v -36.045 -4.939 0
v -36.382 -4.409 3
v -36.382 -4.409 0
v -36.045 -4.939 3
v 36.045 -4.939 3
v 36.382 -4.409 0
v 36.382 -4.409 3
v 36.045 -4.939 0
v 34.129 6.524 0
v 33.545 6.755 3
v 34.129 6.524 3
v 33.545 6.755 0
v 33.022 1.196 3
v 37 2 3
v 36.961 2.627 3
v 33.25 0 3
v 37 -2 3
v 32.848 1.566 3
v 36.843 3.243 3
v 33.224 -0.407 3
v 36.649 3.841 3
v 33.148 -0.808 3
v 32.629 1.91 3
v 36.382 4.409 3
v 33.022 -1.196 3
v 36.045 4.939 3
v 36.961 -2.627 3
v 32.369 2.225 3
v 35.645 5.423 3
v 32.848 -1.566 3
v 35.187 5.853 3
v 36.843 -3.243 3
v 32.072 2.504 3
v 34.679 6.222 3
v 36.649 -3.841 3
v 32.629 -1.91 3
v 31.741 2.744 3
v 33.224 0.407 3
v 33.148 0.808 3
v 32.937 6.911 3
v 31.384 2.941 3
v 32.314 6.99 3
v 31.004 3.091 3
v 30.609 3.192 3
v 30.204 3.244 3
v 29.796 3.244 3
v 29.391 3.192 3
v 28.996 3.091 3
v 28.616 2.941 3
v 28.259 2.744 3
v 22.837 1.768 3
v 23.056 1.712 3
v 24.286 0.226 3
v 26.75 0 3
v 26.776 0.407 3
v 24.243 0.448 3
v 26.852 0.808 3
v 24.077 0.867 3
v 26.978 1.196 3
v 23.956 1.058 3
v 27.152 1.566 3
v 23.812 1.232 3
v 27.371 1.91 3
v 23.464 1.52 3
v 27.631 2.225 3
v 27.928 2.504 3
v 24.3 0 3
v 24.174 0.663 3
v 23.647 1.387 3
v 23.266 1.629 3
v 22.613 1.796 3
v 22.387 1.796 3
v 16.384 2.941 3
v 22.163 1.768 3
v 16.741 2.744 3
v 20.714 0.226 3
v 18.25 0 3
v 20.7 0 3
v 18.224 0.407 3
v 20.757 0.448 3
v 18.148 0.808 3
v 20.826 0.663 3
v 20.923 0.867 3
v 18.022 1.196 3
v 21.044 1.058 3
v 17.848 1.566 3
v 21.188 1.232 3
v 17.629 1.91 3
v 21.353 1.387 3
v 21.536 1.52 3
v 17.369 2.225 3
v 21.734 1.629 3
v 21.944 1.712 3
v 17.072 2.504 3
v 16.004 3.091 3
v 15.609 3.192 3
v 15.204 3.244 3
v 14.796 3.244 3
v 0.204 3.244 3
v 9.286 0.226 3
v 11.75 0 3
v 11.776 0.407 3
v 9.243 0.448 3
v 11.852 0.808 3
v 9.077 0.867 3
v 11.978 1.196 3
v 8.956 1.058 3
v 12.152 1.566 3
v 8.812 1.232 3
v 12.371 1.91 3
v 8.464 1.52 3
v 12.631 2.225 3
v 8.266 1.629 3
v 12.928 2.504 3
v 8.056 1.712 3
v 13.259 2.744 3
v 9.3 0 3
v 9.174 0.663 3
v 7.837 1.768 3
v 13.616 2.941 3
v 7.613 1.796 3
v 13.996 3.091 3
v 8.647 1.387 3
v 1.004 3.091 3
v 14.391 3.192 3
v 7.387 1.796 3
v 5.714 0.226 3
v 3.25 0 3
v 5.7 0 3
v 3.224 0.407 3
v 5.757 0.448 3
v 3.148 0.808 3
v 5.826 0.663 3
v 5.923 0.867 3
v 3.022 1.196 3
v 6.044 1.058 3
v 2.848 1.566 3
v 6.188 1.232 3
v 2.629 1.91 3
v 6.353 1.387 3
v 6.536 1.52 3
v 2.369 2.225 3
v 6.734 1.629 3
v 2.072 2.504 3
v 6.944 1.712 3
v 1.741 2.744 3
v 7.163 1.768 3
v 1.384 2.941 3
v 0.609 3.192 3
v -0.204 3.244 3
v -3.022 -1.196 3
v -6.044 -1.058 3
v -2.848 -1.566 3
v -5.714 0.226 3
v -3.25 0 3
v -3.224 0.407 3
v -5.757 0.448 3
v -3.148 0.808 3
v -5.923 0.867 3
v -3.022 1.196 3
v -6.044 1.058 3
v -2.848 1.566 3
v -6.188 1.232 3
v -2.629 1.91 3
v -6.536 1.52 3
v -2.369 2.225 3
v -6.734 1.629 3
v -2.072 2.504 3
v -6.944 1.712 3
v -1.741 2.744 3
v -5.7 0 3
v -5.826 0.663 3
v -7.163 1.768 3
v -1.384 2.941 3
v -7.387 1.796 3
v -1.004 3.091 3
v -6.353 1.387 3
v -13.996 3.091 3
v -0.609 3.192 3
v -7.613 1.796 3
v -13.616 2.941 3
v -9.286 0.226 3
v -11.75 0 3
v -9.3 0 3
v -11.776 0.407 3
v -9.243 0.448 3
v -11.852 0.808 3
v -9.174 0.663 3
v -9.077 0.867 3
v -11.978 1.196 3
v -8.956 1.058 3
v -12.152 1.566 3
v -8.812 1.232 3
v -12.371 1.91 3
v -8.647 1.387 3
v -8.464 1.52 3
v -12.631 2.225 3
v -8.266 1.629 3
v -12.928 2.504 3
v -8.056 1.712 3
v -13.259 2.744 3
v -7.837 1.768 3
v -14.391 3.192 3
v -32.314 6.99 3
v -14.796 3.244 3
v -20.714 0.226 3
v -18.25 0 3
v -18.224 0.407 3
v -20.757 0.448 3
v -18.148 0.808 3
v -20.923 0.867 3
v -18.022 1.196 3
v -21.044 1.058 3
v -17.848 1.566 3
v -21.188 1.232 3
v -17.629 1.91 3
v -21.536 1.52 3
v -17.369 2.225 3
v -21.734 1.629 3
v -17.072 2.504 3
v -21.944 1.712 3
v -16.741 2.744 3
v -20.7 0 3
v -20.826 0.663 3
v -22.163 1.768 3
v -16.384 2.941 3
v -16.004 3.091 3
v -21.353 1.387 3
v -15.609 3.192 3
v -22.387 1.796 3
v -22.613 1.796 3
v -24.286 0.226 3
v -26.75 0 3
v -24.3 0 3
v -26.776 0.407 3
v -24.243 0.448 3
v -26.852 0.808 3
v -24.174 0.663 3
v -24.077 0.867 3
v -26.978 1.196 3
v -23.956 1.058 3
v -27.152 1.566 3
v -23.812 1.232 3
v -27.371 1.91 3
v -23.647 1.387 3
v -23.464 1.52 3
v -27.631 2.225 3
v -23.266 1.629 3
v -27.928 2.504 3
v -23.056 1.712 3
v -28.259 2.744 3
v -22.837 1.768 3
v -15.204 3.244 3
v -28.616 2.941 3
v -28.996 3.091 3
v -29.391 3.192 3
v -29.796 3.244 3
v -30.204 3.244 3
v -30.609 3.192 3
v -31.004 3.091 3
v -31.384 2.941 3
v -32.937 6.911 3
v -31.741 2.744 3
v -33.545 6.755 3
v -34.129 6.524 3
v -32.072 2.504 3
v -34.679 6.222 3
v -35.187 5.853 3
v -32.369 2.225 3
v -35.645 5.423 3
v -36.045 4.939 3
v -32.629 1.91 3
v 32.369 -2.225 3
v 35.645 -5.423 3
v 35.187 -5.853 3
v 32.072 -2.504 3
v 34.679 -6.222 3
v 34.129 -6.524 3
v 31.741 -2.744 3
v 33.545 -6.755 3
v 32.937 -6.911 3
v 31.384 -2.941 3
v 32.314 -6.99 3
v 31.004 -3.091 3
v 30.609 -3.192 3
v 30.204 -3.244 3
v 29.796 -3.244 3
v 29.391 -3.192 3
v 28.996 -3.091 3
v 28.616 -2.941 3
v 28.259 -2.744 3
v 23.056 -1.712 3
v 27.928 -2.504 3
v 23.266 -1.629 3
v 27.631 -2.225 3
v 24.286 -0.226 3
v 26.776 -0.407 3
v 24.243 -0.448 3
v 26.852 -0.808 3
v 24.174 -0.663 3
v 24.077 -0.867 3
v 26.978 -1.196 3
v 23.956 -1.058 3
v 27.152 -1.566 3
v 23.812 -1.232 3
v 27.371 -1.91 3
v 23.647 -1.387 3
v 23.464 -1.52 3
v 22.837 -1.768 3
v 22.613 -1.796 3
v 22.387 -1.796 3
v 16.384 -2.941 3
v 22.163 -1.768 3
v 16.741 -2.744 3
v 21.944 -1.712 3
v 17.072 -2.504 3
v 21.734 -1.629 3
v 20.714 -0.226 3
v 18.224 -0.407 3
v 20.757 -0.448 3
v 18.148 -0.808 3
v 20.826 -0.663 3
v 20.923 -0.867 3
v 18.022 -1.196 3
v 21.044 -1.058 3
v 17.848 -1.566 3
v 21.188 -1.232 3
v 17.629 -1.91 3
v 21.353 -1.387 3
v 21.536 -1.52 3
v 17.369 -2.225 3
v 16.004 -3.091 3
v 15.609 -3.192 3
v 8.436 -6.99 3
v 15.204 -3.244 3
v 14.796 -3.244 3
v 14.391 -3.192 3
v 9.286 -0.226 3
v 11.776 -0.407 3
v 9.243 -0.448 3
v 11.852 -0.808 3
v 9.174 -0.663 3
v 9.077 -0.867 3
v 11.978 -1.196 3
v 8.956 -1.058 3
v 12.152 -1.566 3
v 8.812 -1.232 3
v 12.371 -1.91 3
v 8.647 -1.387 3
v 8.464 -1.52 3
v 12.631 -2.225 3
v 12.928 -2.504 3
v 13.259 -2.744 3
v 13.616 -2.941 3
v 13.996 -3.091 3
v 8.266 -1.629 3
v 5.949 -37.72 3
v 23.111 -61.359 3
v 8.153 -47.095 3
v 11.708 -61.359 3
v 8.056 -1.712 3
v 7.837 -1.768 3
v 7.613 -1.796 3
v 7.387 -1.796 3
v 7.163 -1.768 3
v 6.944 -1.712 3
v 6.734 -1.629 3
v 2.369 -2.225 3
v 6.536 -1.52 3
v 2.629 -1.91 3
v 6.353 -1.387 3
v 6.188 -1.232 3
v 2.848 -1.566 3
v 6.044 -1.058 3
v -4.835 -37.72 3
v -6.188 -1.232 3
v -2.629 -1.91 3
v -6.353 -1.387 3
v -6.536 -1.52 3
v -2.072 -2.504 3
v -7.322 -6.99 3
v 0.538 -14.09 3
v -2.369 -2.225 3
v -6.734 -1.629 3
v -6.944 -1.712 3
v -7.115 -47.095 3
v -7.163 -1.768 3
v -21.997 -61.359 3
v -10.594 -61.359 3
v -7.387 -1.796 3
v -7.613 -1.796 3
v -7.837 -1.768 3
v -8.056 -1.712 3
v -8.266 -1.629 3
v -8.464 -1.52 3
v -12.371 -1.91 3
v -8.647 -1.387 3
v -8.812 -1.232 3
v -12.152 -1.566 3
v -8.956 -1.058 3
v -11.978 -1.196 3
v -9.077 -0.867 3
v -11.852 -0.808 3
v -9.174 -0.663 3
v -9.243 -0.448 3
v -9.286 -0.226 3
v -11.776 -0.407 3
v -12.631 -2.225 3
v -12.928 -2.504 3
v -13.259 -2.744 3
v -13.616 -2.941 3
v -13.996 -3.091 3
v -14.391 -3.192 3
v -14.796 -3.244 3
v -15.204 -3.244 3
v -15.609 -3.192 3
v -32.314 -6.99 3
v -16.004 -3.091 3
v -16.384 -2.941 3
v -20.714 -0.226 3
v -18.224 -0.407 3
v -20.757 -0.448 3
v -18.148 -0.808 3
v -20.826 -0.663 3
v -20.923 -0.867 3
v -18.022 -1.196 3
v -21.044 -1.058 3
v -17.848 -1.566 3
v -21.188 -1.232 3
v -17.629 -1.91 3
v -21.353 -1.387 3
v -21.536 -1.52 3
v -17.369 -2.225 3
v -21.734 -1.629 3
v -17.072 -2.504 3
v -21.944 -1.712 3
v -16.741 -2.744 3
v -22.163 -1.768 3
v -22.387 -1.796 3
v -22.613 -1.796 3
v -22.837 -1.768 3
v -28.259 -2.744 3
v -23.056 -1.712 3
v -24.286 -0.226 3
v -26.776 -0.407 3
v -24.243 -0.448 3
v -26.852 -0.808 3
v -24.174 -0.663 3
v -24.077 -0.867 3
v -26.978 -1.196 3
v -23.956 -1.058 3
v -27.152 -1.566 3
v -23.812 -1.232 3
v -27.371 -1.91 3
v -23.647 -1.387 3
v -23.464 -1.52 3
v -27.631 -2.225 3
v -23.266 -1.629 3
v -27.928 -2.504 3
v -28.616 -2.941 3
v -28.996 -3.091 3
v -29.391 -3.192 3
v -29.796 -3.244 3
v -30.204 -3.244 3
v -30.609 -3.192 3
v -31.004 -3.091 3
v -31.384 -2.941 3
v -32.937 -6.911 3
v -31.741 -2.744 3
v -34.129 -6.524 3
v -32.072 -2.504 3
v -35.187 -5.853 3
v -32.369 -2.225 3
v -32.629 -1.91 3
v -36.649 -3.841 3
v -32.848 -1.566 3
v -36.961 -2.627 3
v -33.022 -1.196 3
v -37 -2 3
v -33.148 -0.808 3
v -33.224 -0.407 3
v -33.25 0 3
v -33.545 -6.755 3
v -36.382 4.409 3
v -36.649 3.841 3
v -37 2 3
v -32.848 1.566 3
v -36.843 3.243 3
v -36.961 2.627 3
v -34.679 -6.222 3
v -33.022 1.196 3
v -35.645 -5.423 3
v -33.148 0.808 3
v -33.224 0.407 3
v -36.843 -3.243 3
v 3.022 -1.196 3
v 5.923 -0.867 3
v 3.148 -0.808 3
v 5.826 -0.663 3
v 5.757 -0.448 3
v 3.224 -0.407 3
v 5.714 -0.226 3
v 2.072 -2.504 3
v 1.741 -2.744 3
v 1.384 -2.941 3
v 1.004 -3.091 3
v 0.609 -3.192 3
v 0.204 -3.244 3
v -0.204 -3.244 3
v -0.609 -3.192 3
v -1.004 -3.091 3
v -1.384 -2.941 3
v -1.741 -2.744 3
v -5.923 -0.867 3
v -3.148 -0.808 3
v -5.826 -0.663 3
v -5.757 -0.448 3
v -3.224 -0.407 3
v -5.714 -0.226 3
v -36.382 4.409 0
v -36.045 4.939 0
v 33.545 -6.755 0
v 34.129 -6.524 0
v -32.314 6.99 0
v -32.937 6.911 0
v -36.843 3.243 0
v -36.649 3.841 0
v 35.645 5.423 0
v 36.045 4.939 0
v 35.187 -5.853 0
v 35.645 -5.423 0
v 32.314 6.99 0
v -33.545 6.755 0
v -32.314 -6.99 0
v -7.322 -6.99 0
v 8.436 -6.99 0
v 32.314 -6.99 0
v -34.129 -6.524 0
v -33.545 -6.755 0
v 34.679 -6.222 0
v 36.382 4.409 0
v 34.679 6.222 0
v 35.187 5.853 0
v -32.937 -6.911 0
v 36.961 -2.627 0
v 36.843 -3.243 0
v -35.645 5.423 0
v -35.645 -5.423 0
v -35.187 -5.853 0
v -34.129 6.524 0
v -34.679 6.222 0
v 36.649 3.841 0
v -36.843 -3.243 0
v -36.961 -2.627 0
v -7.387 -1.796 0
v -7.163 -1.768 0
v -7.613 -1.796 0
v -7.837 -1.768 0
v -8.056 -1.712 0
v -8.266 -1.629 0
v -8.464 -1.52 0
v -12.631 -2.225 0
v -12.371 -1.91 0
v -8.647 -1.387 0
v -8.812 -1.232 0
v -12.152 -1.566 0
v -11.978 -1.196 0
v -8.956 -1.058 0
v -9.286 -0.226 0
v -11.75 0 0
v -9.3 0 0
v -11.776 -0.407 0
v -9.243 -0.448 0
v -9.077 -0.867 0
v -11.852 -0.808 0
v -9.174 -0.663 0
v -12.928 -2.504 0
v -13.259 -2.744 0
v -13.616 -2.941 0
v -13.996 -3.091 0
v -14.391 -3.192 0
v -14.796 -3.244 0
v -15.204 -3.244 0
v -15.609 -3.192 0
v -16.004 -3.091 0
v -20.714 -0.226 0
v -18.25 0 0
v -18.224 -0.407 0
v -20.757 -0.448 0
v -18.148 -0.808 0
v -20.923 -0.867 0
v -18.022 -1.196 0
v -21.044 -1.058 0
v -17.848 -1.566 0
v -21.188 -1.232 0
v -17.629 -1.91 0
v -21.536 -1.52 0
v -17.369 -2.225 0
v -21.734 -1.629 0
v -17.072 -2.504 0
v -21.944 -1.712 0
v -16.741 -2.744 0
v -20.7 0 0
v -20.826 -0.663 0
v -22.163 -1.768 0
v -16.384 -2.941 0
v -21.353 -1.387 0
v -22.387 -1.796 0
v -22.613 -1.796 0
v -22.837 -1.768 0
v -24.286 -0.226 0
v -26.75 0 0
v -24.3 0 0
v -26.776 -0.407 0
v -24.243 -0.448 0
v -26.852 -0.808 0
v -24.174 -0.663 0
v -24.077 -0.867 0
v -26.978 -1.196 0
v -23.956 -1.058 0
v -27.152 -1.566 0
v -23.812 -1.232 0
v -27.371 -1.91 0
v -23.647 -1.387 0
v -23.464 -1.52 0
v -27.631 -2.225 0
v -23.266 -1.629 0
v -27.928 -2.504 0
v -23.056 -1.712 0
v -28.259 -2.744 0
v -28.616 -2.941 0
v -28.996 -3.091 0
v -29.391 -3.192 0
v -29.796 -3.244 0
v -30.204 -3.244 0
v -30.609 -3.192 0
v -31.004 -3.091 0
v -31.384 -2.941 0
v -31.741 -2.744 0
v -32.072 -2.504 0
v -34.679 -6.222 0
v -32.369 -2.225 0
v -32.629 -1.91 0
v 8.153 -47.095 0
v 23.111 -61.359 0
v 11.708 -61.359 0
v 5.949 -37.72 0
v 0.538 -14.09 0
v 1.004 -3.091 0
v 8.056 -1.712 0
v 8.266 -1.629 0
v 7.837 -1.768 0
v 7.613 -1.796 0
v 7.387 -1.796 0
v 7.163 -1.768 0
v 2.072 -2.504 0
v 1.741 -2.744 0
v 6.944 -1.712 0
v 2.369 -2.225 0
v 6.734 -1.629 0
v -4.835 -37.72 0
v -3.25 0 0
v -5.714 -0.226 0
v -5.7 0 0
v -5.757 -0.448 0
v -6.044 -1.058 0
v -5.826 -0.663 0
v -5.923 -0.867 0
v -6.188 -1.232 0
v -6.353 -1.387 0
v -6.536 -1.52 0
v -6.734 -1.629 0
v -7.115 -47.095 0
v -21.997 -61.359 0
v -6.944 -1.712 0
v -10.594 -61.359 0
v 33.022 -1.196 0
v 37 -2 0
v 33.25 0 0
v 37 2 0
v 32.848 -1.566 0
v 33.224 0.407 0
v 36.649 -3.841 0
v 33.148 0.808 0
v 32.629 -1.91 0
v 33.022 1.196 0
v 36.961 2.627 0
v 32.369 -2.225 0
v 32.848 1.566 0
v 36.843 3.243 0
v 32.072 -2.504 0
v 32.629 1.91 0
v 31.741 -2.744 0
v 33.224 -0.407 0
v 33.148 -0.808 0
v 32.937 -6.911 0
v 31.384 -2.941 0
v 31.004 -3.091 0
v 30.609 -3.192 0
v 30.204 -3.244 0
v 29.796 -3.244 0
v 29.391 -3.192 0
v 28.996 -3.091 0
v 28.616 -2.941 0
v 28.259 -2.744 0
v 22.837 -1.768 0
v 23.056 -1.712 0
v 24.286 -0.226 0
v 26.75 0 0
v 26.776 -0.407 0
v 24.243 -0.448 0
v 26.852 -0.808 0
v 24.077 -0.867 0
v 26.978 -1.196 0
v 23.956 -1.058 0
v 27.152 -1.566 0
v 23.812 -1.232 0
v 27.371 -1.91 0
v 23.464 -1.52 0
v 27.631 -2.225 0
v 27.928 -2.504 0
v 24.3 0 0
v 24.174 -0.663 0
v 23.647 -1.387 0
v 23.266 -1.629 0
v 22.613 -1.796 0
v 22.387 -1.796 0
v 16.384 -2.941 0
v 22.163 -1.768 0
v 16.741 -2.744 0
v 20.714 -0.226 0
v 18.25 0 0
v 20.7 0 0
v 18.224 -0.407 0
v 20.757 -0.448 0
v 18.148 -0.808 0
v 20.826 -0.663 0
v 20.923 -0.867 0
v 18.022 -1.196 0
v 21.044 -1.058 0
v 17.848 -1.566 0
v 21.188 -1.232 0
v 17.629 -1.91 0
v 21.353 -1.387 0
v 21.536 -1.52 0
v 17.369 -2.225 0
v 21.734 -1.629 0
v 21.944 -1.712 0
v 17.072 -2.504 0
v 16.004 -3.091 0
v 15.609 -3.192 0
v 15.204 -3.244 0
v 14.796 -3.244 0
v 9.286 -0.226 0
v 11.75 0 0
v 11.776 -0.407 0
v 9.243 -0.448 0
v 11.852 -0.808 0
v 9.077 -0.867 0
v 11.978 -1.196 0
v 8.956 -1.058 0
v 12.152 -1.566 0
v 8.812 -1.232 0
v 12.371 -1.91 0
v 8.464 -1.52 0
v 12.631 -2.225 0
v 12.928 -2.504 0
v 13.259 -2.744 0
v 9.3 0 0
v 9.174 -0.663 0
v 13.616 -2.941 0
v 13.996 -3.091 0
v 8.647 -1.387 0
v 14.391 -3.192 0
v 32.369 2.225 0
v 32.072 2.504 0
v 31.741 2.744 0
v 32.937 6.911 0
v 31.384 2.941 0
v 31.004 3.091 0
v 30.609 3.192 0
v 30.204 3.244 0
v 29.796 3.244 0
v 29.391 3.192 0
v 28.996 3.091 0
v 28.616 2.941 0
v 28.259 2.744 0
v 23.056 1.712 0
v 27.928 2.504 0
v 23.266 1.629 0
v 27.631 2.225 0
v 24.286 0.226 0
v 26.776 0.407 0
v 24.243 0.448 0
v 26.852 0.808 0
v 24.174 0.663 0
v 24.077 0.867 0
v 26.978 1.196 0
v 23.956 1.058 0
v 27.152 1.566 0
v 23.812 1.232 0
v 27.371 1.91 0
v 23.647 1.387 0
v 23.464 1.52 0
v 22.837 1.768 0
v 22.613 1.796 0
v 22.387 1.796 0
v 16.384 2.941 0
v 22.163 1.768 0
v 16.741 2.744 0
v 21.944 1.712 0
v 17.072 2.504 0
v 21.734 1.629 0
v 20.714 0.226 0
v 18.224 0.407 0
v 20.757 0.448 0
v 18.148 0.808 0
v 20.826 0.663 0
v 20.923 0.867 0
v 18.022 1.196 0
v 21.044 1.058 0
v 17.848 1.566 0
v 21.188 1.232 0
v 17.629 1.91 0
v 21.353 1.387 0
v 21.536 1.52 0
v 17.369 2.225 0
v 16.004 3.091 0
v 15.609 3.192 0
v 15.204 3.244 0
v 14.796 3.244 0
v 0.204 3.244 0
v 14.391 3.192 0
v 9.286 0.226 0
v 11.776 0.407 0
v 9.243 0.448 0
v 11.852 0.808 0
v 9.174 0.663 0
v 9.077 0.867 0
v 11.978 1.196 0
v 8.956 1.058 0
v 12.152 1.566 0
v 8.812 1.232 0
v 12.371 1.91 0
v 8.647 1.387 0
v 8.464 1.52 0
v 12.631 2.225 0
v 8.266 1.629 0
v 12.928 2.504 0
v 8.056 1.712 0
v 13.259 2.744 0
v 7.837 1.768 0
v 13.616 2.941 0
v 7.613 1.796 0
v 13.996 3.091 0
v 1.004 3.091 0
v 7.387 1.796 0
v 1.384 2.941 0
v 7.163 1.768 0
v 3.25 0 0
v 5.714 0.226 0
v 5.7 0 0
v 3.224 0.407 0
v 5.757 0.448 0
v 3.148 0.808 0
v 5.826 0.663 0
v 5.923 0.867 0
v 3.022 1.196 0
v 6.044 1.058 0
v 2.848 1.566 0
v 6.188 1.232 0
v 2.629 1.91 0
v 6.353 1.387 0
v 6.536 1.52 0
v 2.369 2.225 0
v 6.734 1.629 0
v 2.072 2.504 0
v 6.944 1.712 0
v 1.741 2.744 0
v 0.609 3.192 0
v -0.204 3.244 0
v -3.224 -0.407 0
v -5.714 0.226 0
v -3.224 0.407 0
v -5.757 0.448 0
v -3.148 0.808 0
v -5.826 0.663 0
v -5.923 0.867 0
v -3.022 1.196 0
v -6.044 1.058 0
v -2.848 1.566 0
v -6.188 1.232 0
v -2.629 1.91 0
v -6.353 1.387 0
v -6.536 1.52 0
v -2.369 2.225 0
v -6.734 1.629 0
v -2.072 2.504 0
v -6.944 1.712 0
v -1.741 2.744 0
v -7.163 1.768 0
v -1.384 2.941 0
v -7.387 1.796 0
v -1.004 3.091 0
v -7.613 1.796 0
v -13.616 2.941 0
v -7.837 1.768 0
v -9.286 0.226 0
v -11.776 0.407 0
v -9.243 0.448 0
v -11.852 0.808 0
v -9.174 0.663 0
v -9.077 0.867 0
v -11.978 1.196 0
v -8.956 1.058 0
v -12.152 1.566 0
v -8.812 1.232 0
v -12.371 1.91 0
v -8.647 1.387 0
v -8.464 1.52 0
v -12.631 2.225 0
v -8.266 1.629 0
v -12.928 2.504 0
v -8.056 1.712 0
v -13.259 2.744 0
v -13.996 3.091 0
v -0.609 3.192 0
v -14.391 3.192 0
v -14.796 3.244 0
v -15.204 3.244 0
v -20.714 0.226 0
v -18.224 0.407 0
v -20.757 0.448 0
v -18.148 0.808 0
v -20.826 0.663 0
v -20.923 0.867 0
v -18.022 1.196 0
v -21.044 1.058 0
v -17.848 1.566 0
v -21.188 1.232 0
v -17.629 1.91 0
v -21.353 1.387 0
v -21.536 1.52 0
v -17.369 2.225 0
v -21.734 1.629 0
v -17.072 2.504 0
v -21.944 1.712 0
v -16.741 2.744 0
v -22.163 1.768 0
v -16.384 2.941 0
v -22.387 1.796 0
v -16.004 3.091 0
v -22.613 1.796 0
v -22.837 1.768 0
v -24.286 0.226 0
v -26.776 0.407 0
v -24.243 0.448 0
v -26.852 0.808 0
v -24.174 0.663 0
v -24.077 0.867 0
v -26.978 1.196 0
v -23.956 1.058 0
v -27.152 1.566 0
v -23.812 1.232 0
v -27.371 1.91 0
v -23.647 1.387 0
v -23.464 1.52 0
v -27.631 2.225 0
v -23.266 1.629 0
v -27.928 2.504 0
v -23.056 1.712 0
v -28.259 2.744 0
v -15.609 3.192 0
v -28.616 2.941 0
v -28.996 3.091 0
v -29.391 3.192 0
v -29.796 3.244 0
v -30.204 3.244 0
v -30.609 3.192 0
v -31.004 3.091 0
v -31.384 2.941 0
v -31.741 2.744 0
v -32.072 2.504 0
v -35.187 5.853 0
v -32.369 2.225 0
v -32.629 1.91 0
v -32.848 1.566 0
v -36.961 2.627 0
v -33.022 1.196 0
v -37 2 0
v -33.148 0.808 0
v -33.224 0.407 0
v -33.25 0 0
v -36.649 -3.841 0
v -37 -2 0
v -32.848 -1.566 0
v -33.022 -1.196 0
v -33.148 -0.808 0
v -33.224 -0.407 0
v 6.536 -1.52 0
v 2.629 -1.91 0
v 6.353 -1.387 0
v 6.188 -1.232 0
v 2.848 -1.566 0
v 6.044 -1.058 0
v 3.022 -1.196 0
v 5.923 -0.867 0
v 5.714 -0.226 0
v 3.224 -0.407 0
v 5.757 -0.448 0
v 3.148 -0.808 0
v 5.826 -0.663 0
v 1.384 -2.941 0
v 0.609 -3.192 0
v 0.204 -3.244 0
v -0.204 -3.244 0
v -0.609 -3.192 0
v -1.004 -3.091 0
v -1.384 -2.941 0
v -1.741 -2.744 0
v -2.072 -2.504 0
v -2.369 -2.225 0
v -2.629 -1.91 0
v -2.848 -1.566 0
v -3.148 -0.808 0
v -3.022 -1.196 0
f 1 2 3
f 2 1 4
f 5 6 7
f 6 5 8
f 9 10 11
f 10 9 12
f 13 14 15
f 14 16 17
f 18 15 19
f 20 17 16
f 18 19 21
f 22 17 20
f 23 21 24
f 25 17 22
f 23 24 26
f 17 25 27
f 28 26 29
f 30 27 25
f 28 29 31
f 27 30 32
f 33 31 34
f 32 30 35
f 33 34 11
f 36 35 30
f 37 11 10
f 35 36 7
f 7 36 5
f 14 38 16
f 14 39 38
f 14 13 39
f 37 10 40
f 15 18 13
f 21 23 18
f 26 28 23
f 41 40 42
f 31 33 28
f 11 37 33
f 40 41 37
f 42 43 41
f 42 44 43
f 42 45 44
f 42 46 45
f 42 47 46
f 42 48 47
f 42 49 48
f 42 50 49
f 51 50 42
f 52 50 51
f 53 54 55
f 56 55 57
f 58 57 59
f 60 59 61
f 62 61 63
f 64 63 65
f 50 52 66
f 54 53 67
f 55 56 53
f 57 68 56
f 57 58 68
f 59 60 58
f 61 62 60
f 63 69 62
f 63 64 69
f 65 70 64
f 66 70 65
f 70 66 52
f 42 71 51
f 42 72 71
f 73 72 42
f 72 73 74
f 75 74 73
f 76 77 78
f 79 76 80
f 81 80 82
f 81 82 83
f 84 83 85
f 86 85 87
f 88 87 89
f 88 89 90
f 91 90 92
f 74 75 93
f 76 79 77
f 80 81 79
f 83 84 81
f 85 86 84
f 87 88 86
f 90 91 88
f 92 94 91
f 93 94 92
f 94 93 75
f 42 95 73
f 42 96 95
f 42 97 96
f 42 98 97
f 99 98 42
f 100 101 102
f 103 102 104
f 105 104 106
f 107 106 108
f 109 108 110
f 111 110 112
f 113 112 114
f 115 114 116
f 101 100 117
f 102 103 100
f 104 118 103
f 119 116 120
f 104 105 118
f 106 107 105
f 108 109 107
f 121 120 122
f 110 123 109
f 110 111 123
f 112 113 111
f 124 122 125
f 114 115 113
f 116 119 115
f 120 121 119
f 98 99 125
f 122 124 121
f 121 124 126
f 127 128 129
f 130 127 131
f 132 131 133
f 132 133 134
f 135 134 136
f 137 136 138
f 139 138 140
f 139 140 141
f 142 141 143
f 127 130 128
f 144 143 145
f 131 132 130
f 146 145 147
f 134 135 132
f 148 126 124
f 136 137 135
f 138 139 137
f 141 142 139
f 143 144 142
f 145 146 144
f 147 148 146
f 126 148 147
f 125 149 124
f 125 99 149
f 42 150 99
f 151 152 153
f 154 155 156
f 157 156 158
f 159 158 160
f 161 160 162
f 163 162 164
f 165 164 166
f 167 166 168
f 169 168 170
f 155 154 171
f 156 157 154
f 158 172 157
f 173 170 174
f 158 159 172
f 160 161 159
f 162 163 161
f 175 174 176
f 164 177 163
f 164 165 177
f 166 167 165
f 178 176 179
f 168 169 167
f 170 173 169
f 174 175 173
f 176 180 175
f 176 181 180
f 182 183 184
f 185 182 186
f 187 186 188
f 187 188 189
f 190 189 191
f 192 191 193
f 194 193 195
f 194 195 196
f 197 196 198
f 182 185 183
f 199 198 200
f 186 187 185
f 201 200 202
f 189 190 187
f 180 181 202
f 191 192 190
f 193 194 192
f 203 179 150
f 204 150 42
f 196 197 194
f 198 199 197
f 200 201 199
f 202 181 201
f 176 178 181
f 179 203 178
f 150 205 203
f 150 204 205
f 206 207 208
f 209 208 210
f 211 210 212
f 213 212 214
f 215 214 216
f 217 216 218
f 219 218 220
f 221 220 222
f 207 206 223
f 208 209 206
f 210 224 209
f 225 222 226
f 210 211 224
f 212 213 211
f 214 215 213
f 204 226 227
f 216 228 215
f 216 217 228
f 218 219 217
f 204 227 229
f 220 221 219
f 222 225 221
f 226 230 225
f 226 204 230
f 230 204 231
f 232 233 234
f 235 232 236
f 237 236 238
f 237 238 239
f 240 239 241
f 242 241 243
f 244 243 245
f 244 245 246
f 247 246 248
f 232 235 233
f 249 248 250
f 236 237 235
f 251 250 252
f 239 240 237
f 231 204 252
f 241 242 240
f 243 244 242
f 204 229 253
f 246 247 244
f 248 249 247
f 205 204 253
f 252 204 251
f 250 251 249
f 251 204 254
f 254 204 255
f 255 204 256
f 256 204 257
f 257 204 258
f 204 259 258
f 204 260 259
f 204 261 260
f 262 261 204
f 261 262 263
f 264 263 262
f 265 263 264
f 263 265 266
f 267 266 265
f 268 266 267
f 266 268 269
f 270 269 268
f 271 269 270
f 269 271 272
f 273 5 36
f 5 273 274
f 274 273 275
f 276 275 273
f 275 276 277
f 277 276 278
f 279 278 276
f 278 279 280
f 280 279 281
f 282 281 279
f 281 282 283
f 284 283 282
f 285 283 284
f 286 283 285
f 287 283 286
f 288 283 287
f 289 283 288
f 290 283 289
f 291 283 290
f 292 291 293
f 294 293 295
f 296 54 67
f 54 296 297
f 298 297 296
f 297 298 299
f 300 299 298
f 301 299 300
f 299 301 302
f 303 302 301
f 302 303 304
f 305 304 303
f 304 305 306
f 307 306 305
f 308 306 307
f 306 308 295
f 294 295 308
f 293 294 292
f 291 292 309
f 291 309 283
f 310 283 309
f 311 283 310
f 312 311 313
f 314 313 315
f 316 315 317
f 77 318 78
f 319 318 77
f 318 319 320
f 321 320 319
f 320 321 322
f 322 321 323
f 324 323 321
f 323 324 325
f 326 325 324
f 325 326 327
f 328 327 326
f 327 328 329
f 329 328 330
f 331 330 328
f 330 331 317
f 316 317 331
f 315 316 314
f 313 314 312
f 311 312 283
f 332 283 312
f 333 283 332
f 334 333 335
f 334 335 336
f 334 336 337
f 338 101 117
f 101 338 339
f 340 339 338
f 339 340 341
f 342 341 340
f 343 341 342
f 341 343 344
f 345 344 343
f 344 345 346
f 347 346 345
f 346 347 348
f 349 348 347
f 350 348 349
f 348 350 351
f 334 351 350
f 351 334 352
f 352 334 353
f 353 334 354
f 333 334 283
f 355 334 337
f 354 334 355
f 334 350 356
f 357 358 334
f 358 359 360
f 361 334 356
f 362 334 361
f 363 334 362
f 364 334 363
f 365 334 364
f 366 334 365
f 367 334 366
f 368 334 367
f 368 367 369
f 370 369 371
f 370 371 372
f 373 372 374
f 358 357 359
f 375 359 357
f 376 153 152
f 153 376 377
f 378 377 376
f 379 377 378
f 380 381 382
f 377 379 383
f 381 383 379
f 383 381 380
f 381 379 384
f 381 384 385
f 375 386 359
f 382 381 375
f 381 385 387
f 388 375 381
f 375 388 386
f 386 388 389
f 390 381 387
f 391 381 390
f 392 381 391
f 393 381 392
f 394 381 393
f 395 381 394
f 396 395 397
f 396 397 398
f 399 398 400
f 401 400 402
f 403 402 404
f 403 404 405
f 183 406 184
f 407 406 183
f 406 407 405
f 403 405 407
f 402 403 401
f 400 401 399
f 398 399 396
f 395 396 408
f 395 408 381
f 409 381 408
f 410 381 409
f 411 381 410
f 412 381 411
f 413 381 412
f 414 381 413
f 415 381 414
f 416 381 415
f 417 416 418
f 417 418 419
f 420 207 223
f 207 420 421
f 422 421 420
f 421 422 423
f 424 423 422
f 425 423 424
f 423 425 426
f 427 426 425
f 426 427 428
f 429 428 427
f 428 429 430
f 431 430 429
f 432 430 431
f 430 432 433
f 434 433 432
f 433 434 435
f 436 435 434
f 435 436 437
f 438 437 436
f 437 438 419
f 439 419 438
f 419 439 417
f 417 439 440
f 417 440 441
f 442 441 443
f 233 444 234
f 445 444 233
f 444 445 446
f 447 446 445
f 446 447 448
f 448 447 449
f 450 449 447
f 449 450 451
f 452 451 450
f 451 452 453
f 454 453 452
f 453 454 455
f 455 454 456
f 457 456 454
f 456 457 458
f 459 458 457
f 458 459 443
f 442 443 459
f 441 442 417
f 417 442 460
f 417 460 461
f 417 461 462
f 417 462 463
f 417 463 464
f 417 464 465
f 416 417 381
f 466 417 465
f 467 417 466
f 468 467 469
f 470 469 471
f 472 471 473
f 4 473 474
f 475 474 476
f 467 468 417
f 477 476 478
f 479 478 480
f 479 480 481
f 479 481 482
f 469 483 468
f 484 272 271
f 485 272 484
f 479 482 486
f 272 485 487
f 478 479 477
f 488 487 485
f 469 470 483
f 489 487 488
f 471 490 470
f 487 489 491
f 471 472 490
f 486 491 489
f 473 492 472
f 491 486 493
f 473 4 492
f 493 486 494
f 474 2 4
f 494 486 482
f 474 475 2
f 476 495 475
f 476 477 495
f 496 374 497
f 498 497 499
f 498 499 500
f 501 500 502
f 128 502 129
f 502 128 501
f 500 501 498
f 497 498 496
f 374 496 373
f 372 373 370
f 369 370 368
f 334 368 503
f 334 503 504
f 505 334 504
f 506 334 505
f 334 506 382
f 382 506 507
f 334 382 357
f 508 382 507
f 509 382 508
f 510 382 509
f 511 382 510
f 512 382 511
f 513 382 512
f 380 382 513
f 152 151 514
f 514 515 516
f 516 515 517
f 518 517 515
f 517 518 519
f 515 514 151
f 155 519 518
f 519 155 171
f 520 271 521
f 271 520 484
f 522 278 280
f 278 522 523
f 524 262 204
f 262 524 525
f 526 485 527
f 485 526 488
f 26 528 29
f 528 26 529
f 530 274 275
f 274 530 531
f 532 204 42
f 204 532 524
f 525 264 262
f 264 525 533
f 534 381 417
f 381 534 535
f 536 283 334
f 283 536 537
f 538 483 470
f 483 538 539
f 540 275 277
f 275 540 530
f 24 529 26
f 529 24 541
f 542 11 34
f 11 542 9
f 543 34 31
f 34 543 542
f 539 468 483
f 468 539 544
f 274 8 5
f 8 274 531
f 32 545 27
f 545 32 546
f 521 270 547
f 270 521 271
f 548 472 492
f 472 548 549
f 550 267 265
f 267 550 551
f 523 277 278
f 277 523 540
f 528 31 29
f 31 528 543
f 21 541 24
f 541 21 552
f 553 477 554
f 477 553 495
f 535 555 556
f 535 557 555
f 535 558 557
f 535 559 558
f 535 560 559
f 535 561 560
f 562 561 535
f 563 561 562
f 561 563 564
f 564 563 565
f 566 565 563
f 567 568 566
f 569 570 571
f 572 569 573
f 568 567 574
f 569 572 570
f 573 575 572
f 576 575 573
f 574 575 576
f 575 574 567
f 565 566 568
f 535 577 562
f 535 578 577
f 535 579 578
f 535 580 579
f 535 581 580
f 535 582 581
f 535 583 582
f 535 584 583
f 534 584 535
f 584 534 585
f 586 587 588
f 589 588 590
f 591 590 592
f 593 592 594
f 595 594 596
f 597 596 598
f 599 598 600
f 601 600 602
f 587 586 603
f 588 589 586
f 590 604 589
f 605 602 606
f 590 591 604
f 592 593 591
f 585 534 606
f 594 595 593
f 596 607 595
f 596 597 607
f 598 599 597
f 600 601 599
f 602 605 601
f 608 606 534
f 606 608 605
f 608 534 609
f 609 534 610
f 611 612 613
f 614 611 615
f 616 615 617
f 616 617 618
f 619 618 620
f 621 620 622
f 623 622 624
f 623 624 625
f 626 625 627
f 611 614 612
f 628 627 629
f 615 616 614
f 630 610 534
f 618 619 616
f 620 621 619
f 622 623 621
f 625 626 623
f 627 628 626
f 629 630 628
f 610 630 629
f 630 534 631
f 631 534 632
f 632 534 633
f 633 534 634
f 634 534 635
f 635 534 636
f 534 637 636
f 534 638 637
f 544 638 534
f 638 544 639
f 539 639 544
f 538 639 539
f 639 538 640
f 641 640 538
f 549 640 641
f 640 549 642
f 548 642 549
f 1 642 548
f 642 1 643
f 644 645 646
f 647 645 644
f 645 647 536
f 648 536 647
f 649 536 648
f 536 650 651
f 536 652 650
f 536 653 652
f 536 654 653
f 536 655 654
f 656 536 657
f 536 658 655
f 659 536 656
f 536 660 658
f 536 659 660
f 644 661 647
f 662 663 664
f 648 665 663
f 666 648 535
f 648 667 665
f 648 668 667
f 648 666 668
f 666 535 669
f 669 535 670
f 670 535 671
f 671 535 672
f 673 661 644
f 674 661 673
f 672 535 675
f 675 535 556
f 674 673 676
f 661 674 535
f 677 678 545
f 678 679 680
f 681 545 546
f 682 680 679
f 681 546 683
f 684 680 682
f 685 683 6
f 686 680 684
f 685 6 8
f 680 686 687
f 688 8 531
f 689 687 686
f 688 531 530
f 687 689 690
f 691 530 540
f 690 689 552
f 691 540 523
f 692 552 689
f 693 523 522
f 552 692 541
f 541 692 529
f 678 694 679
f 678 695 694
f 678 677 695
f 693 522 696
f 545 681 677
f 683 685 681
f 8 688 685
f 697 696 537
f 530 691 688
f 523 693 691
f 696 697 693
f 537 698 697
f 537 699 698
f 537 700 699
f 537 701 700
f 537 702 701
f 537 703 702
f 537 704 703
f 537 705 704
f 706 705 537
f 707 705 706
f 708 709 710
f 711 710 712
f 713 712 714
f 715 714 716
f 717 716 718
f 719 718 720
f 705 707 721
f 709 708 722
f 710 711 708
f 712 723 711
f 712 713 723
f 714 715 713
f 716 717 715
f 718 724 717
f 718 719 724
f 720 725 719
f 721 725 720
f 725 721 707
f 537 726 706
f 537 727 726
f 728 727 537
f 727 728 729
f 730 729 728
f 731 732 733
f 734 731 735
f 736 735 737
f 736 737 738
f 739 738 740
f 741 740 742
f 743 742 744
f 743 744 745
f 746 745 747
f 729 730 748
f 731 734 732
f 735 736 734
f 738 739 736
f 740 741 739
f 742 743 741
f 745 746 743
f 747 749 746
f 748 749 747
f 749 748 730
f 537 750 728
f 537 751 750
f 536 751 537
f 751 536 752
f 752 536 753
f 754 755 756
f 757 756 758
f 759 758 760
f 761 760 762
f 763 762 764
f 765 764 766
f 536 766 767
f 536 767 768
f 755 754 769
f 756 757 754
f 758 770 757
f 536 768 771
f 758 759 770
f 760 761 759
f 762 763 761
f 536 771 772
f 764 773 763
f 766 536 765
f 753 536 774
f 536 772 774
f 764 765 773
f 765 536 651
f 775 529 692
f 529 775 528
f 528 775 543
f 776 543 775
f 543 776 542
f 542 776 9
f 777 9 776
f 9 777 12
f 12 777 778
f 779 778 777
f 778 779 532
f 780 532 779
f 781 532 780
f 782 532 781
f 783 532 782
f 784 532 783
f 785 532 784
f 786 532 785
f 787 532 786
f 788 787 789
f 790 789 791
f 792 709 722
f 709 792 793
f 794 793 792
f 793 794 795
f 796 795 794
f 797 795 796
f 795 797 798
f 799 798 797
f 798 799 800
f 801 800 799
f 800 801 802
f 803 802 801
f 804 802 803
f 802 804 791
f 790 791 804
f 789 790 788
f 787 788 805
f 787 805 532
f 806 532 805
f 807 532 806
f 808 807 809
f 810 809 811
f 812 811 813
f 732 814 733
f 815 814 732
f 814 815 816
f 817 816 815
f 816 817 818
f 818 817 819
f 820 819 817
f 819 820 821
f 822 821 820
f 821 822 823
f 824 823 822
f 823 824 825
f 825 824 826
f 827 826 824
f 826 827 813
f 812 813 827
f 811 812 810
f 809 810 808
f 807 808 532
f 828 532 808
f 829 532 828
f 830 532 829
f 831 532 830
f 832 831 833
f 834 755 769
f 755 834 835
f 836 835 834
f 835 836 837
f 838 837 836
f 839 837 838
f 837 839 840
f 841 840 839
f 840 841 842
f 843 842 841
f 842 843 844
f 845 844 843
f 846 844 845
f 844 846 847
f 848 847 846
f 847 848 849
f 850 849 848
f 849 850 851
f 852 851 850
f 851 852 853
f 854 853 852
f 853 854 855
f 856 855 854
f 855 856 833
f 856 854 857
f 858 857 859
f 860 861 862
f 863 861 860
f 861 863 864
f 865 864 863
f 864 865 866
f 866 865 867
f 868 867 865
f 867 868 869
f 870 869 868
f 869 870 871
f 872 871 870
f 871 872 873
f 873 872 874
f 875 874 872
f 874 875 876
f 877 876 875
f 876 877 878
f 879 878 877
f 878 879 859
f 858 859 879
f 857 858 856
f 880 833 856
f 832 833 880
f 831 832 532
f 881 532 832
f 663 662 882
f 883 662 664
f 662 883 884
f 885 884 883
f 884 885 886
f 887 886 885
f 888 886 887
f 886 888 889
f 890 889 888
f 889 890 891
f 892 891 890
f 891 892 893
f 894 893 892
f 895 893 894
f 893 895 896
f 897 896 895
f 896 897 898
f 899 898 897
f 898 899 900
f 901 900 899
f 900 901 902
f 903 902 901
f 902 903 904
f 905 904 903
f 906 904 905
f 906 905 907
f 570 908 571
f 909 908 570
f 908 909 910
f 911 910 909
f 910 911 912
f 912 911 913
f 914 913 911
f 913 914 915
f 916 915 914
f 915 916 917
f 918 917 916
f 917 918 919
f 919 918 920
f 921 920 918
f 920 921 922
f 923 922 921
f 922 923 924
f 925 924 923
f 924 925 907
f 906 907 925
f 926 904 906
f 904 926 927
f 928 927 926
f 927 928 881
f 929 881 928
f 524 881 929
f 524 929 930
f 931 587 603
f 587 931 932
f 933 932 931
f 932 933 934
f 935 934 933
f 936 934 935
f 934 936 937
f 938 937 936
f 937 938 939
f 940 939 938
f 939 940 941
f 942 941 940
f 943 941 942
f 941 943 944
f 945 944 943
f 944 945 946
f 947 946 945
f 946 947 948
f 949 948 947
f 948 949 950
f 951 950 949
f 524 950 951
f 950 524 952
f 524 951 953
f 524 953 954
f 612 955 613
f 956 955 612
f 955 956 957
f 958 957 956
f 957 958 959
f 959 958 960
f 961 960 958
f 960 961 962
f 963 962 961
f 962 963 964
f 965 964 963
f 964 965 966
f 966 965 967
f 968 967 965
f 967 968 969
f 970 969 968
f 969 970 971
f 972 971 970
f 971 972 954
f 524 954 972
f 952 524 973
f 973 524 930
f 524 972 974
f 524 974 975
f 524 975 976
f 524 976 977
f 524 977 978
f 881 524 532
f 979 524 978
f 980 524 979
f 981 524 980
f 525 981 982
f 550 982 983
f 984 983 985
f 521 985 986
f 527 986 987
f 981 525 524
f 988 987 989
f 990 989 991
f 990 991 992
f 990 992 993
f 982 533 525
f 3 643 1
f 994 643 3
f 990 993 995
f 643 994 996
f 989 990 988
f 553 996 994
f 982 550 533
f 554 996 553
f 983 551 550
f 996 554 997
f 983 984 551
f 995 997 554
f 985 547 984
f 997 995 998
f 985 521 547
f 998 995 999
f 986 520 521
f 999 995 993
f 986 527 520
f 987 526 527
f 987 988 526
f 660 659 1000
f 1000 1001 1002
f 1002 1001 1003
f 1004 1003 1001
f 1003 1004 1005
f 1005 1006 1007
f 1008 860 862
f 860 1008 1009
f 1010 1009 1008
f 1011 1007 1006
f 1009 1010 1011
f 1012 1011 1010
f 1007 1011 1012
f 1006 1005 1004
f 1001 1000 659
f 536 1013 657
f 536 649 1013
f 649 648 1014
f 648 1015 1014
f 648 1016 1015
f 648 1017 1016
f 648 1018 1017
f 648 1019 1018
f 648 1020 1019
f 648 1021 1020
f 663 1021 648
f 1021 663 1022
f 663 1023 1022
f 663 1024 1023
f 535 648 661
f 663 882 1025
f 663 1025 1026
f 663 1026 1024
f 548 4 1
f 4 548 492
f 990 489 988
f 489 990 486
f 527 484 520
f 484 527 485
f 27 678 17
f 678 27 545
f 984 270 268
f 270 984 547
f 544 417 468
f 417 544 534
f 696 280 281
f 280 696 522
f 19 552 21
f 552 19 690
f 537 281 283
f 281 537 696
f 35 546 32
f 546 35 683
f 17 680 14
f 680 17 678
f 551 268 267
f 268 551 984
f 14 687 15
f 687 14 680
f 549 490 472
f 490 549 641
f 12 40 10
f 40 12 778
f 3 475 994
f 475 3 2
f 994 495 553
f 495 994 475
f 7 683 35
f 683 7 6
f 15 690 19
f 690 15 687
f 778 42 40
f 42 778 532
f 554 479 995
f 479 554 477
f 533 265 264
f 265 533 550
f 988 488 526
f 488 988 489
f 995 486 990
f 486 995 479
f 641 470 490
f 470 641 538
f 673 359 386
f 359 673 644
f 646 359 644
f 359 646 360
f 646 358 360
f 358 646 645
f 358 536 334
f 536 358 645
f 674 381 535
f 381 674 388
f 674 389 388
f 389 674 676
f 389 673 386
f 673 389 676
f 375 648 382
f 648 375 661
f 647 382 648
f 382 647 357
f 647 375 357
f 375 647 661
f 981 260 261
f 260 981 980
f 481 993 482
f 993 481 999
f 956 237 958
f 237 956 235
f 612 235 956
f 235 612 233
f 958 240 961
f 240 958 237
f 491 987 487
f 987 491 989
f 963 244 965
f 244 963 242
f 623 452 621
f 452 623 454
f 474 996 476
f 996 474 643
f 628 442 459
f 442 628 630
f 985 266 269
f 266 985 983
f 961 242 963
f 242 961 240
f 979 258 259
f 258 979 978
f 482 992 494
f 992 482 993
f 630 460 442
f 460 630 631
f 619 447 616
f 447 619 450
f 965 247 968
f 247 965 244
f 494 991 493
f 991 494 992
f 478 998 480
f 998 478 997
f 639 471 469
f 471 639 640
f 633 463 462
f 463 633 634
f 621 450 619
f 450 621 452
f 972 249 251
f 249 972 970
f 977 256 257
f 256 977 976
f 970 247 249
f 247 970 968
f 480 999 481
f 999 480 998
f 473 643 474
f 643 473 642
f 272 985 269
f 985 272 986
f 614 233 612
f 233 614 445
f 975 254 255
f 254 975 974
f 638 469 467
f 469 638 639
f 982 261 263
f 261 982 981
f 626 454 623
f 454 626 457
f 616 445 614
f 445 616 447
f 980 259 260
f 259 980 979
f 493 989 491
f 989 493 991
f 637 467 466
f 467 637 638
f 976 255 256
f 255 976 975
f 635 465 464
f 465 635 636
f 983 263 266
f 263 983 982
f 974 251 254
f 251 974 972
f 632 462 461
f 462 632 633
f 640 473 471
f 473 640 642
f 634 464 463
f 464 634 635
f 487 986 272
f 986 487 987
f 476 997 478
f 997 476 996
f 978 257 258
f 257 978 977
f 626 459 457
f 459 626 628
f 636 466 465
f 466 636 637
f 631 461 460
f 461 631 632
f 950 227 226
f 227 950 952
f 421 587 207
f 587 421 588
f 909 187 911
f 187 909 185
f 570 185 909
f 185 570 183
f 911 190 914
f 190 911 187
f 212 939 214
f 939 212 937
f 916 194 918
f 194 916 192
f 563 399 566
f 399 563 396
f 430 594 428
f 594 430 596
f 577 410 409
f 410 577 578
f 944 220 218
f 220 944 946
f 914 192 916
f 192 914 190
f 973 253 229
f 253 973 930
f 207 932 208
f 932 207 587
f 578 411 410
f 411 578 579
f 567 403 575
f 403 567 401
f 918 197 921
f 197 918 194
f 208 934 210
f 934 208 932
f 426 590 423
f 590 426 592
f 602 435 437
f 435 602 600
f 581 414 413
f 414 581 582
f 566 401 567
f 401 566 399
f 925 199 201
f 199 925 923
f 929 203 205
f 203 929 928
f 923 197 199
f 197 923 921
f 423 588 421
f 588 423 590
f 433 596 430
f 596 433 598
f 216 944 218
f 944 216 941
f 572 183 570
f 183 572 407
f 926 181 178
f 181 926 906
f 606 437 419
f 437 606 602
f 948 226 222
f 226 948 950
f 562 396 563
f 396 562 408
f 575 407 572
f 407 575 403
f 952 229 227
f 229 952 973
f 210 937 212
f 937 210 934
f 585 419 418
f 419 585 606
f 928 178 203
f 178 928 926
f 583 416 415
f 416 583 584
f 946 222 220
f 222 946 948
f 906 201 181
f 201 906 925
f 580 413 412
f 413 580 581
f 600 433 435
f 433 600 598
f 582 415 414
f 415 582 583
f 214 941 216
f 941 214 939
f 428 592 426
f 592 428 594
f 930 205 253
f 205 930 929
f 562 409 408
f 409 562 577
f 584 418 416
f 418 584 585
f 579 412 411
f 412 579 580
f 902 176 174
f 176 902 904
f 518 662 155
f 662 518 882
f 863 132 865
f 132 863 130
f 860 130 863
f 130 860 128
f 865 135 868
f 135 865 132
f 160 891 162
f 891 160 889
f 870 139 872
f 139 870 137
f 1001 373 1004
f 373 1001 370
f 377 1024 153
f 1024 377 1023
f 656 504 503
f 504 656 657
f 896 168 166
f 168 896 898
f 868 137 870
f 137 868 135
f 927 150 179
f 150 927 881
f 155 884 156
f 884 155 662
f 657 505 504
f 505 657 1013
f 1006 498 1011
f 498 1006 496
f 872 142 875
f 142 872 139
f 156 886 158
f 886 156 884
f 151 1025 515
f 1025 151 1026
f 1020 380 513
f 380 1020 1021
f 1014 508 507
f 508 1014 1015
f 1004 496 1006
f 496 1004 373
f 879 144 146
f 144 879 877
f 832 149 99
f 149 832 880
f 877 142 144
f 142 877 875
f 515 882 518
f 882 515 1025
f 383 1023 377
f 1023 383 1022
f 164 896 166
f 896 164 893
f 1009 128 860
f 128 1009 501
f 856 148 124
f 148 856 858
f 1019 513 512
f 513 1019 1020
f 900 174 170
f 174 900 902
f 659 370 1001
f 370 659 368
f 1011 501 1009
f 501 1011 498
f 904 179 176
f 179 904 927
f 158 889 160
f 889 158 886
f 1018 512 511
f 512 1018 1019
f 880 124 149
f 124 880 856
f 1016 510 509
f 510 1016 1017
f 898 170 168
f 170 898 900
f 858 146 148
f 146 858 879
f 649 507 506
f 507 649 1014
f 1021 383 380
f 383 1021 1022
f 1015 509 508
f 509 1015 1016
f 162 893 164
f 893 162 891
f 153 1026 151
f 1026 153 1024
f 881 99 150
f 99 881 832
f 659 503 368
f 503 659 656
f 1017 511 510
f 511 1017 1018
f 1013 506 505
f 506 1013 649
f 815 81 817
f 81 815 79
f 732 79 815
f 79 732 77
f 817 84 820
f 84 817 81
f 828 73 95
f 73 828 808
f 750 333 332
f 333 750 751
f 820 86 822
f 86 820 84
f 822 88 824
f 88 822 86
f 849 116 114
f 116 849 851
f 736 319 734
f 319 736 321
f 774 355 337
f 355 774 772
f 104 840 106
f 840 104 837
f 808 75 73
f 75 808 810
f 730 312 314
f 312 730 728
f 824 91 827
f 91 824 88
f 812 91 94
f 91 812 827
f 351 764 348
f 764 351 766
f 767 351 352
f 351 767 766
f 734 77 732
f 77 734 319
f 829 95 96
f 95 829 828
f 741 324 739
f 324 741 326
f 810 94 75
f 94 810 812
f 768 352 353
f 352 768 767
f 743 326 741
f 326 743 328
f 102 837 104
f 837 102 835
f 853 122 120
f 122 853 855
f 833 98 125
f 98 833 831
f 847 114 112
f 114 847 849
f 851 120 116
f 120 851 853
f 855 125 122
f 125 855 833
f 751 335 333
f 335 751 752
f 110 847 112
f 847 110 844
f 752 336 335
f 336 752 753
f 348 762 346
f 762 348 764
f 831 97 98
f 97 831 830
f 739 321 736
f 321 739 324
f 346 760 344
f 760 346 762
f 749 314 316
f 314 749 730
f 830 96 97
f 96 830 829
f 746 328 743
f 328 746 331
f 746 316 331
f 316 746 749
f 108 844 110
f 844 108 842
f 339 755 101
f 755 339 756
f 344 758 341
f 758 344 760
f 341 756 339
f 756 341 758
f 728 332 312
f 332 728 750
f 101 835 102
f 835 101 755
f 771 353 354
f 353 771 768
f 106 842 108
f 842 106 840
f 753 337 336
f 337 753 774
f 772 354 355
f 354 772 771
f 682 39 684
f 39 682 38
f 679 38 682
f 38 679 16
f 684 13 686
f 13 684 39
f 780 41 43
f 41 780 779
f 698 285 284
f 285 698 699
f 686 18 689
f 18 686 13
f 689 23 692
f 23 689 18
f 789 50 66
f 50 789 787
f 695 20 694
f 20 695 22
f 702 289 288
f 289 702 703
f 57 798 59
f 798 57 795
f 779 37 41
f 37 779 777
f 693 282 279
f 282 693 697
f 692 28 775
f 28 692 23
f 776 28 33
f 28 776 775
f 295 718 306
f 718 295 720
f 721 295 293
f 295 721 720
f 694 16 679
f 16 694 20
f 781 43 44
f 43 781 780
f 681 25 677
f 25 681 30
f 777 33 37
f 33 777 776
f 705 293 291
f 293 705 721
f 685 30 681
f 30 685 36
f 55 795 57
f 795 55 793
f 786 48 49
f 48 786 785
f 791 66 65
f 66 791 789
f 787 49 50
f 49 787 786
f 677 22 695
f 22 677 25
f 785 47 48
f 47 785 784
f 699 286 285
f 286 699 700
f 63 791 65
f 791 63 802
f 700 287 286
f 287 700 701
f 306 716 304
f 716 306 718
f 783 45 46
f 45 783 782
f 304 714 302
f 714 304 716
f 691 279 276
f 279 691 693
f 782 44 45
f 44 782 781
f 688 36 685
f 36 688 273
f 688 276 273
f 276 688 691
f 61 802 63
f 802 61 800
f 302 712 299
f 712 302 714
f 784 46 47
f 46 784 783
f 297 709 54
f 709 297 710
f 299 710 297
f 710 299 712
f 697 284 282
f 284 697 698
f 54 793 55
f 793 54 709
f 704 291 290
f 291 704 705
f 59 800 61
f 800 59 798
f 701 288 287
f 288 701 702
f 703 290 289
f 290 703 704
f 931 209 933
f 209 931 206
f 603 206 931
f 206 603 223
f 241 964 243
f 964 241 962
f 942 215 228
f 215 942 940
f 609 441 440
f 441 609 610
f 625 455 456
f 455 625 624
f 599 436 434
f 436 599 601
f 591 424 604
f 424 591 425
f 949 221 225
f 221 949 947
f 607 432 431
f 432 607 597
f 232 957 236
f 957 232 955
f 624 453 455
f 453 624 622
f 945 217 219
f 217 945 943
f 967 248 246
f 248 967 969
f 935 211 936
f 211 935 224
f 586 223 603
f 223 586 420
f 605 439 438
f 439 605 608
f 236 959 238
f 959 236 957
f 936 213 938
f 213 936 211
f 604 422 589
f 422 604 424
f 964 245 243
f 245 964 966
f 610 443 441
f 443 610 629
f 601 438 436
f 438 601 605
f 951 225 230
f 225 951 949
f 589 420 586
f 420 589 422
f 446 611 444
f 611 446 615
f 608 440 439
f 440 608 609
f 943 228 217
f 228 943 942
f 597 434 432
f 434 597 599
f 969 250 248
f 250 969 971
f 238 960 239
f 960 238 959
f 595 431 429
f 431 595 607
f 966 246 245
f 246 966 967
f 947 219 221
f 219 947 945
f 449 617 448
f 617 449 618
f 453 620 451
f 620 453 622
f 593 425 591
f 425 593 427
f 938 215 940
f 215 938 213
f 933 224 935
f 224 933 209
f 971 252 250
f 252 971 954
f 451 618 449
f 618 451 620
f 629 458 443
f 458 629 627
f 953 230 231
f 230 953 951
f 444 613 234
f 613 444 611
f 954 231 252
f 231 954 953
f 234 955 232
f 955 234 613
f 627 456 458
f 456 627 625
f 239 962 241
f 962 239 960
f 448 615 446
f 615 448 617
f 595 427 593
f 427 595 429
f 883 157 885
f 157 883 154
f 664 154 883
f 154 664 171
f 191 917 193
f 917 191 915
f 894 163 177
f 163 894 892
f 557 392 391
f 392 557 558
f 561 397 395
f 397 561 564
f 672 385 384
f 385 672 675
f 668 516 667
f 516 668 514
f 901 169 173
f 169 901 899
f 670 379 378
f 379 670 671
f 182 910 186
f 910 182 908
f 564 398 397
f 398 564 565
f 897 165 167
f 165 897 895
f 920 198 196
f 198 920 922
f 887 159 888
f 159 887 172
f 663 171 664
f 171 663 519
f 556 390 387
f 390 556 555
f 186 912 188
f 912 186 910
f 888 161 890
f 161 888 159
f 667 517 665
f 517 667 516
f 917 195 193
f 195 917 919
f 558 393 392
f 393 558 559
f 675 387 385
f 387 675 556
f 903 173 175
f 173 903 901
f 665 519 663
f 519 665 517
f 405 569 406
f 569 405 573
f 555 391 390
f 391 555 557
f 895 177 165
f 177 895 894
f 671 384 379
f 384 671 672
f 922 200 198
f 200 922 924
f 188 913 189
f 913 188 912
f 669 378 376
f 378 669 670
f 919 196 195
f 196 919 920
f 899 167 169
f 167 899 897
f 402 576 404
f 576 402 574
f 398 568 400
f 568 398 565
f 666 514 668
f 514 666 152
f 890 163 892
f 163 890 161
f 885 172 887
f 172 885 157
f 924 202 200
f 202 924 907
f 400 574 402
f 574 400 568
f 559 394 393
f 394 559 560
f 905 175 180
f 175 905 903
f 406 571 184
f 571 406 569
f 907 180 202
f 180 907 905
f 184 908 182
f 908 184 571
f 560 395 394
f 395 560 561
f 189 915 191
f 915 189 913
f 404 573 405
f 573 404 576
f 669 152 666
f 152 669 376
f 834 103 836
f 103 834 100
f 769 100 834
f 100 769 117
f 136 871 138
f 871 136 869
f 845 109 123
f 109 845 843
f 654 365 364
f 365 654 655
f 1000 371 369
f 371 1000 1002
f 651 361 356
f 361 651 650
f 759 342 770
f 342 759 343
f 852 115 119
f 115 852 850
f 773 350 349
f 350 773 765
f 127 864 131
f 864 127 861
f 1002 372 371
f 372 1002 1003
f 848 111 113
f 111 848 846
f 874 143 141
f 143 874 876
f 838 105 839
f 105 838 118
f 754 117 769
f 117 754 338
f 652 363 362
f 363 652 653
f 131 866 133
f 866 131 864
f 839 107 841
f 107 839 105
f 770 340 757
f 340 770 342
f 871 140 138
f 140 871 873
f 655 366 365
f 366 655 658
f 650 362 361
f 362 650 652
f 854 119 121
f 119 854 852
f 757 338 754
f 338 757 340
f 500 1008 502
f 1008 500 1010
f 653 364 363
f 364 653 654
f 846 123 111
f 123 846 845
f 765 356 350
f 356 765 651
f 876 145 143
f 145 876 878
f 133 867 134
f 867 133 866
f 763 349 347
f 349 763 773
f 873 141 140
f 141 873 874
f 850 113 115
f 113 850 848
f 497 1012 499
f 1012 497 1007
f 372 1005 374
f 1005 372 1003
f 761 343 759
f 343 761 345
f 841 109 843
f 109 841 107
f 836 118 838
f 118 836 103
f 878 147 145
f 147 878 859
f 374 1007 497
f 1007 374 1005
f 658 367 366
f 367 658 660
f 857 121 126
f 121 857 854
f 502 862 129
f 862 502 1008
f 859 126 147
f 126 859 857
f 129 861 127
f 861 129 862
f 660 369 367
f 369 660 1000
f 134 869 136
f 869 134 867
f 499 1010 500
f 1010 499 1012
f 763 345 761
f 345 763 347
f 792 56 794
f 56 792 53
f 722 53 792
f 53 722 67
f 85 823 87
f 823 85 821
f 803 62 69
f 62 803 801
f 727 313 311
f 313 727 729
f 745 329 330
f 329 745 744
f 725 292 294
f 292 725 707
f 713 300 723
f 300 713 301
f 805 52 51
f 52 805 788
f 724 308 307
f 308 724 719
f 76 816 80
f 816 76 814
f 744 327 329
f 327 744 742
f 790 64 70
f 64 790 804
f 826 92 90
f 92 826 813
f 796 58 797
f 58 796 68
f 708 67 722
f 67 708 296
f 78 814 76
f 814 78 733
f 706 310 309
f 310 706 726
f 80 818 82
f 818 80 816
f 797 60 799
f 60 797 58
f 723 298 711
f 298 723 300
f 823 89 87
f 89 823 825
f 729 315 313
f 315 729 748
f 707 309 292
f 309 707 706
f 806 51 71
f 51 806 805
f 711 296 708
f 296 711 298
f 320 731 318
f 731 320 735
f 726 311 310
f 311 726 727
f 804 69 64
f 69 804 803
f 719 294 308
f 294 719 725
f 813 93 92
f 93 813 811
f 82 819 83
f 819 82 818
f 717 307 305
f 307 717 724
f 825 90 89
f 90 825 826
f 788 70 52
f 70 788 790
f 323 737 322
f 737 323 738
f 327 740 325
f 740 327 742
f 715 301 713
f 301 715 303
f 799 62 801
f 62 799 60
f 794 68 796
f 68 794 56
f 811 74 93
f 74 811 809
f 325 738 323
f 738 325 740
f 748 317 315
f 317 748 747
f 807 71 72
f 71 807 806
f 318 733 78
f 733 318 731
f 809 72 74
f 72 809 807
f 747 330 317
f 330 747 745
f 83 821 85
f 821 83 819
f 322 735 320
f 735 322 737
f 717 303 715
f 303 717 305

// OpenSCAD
$fn = 50;


difference() {
	union() {
		hull() {
			translate(v = [-32.0000000000, 2.0000000000, 0]) {
				cylinder(h = 3, r = 5);
			}
			translate(v = [32.0000000000, 2.0000000000, 0]) {
				cylinder(h = 3, r = 5);
			}
			translate(v = [-32.0000000000, -2.0000000000, 0]) {
				cylinder(h = 3, r = 5);
			}
			translate(v = [32.0000000000, -2.0000000000, 0]) {
				cylinder(h = 3, r = 5);
			}
		}
		translate(v = [0, -5, 0]) {
			linear_extrude(height = 3) {
				text(font = "DejaVu Sans Mono:style=Bold", halign = "center", size = 57.0000000000, text = "A", valign = "top");
			}
		}
	}
	union() {
		translate(v = [-30.0000000000, 0.0000000000, 0]) {
			translate(v = [0, 0, -100]) {
				cylinder(h = 200, r = 3.2500000000);
			}
		}
		translate(v = [-15.0000000000, 0.0000000000, 0]) {
			translate(v = [0, 0, -100]) {
				cylinder(h = 200, r = 3.2500000000);
			}
		}
		translate(v = [0, 0, -100]) {
			cylinder(h = 200, r = 3.2500000000);
		}
		translate(v = [15.0000000000, 0.0000000000, 0]) {
			translate(v = [0, 0, -100]) {
				cylinder(h = 200, r = 3.2500000000);
			}
		}
		translate(v = [30.0000000000, 0.0000000000, 0]) {
			translate(v = [0, 0, -100]) {
				cylinder(h = 200, r = 3.2500000000);
			}
		}
		translate(v = [-30.0000000000, 0.0000000000, 0]) {
			translate(v = [0, 0, -100]) {
				cylinder(h = 200, r = 1.8000000000);
			}
		}
		translate(v = [-22.5000000000, 0.0000000000, 0]) {
			translate(v = [0, 0, -100]) {
				cylinder(h = 200, r = 1.8000000000);
			}
		}
		translate(v = [-15.0000000000, 0.0000000000, 0]) {
			translate(v = [0, 0, -100]) {
				cylinder(h = 200, r = 1.8000000000);
			}
		}
		translate(v = [-7.5000000000, 0.0000000000, 0]) {
			translate(v = [0, 0, -100]) {
				cylinder(h = 200, r = 1.8000000000);
			}
		}
		translate(v = [0, 0, -100]) {
			cylinder(h = 200, r = 1.8000000000);
		}
		translate(v = [7.5000000000, 0.0000000000, 0]) {
			translate(v = [0, 0, -100]) {
				cylinder(h = 200, r = 1.8000000000);
			}
		}
		translate(v = [15.0000000000, 0.0000000000, 0]) {
			translate(v = [0, 0, -100]) {
				cylinder(h = 200, r = 1.8000000000);
			}
		}
		translate(v = [22.5000000000, 0.0000000000, 0]) {
			translate(v = [0, 0, -100]) {
				cylinder(h = 200, r = 1.8000000000);
			}
		}
		translate(v = [30.0000000000, 0.0000000000, 0]) {
			translate(v = [0, 0, -100]) {
				cylinder(h = 200, r = 1.8000000000);
			}
		}
	}
}
